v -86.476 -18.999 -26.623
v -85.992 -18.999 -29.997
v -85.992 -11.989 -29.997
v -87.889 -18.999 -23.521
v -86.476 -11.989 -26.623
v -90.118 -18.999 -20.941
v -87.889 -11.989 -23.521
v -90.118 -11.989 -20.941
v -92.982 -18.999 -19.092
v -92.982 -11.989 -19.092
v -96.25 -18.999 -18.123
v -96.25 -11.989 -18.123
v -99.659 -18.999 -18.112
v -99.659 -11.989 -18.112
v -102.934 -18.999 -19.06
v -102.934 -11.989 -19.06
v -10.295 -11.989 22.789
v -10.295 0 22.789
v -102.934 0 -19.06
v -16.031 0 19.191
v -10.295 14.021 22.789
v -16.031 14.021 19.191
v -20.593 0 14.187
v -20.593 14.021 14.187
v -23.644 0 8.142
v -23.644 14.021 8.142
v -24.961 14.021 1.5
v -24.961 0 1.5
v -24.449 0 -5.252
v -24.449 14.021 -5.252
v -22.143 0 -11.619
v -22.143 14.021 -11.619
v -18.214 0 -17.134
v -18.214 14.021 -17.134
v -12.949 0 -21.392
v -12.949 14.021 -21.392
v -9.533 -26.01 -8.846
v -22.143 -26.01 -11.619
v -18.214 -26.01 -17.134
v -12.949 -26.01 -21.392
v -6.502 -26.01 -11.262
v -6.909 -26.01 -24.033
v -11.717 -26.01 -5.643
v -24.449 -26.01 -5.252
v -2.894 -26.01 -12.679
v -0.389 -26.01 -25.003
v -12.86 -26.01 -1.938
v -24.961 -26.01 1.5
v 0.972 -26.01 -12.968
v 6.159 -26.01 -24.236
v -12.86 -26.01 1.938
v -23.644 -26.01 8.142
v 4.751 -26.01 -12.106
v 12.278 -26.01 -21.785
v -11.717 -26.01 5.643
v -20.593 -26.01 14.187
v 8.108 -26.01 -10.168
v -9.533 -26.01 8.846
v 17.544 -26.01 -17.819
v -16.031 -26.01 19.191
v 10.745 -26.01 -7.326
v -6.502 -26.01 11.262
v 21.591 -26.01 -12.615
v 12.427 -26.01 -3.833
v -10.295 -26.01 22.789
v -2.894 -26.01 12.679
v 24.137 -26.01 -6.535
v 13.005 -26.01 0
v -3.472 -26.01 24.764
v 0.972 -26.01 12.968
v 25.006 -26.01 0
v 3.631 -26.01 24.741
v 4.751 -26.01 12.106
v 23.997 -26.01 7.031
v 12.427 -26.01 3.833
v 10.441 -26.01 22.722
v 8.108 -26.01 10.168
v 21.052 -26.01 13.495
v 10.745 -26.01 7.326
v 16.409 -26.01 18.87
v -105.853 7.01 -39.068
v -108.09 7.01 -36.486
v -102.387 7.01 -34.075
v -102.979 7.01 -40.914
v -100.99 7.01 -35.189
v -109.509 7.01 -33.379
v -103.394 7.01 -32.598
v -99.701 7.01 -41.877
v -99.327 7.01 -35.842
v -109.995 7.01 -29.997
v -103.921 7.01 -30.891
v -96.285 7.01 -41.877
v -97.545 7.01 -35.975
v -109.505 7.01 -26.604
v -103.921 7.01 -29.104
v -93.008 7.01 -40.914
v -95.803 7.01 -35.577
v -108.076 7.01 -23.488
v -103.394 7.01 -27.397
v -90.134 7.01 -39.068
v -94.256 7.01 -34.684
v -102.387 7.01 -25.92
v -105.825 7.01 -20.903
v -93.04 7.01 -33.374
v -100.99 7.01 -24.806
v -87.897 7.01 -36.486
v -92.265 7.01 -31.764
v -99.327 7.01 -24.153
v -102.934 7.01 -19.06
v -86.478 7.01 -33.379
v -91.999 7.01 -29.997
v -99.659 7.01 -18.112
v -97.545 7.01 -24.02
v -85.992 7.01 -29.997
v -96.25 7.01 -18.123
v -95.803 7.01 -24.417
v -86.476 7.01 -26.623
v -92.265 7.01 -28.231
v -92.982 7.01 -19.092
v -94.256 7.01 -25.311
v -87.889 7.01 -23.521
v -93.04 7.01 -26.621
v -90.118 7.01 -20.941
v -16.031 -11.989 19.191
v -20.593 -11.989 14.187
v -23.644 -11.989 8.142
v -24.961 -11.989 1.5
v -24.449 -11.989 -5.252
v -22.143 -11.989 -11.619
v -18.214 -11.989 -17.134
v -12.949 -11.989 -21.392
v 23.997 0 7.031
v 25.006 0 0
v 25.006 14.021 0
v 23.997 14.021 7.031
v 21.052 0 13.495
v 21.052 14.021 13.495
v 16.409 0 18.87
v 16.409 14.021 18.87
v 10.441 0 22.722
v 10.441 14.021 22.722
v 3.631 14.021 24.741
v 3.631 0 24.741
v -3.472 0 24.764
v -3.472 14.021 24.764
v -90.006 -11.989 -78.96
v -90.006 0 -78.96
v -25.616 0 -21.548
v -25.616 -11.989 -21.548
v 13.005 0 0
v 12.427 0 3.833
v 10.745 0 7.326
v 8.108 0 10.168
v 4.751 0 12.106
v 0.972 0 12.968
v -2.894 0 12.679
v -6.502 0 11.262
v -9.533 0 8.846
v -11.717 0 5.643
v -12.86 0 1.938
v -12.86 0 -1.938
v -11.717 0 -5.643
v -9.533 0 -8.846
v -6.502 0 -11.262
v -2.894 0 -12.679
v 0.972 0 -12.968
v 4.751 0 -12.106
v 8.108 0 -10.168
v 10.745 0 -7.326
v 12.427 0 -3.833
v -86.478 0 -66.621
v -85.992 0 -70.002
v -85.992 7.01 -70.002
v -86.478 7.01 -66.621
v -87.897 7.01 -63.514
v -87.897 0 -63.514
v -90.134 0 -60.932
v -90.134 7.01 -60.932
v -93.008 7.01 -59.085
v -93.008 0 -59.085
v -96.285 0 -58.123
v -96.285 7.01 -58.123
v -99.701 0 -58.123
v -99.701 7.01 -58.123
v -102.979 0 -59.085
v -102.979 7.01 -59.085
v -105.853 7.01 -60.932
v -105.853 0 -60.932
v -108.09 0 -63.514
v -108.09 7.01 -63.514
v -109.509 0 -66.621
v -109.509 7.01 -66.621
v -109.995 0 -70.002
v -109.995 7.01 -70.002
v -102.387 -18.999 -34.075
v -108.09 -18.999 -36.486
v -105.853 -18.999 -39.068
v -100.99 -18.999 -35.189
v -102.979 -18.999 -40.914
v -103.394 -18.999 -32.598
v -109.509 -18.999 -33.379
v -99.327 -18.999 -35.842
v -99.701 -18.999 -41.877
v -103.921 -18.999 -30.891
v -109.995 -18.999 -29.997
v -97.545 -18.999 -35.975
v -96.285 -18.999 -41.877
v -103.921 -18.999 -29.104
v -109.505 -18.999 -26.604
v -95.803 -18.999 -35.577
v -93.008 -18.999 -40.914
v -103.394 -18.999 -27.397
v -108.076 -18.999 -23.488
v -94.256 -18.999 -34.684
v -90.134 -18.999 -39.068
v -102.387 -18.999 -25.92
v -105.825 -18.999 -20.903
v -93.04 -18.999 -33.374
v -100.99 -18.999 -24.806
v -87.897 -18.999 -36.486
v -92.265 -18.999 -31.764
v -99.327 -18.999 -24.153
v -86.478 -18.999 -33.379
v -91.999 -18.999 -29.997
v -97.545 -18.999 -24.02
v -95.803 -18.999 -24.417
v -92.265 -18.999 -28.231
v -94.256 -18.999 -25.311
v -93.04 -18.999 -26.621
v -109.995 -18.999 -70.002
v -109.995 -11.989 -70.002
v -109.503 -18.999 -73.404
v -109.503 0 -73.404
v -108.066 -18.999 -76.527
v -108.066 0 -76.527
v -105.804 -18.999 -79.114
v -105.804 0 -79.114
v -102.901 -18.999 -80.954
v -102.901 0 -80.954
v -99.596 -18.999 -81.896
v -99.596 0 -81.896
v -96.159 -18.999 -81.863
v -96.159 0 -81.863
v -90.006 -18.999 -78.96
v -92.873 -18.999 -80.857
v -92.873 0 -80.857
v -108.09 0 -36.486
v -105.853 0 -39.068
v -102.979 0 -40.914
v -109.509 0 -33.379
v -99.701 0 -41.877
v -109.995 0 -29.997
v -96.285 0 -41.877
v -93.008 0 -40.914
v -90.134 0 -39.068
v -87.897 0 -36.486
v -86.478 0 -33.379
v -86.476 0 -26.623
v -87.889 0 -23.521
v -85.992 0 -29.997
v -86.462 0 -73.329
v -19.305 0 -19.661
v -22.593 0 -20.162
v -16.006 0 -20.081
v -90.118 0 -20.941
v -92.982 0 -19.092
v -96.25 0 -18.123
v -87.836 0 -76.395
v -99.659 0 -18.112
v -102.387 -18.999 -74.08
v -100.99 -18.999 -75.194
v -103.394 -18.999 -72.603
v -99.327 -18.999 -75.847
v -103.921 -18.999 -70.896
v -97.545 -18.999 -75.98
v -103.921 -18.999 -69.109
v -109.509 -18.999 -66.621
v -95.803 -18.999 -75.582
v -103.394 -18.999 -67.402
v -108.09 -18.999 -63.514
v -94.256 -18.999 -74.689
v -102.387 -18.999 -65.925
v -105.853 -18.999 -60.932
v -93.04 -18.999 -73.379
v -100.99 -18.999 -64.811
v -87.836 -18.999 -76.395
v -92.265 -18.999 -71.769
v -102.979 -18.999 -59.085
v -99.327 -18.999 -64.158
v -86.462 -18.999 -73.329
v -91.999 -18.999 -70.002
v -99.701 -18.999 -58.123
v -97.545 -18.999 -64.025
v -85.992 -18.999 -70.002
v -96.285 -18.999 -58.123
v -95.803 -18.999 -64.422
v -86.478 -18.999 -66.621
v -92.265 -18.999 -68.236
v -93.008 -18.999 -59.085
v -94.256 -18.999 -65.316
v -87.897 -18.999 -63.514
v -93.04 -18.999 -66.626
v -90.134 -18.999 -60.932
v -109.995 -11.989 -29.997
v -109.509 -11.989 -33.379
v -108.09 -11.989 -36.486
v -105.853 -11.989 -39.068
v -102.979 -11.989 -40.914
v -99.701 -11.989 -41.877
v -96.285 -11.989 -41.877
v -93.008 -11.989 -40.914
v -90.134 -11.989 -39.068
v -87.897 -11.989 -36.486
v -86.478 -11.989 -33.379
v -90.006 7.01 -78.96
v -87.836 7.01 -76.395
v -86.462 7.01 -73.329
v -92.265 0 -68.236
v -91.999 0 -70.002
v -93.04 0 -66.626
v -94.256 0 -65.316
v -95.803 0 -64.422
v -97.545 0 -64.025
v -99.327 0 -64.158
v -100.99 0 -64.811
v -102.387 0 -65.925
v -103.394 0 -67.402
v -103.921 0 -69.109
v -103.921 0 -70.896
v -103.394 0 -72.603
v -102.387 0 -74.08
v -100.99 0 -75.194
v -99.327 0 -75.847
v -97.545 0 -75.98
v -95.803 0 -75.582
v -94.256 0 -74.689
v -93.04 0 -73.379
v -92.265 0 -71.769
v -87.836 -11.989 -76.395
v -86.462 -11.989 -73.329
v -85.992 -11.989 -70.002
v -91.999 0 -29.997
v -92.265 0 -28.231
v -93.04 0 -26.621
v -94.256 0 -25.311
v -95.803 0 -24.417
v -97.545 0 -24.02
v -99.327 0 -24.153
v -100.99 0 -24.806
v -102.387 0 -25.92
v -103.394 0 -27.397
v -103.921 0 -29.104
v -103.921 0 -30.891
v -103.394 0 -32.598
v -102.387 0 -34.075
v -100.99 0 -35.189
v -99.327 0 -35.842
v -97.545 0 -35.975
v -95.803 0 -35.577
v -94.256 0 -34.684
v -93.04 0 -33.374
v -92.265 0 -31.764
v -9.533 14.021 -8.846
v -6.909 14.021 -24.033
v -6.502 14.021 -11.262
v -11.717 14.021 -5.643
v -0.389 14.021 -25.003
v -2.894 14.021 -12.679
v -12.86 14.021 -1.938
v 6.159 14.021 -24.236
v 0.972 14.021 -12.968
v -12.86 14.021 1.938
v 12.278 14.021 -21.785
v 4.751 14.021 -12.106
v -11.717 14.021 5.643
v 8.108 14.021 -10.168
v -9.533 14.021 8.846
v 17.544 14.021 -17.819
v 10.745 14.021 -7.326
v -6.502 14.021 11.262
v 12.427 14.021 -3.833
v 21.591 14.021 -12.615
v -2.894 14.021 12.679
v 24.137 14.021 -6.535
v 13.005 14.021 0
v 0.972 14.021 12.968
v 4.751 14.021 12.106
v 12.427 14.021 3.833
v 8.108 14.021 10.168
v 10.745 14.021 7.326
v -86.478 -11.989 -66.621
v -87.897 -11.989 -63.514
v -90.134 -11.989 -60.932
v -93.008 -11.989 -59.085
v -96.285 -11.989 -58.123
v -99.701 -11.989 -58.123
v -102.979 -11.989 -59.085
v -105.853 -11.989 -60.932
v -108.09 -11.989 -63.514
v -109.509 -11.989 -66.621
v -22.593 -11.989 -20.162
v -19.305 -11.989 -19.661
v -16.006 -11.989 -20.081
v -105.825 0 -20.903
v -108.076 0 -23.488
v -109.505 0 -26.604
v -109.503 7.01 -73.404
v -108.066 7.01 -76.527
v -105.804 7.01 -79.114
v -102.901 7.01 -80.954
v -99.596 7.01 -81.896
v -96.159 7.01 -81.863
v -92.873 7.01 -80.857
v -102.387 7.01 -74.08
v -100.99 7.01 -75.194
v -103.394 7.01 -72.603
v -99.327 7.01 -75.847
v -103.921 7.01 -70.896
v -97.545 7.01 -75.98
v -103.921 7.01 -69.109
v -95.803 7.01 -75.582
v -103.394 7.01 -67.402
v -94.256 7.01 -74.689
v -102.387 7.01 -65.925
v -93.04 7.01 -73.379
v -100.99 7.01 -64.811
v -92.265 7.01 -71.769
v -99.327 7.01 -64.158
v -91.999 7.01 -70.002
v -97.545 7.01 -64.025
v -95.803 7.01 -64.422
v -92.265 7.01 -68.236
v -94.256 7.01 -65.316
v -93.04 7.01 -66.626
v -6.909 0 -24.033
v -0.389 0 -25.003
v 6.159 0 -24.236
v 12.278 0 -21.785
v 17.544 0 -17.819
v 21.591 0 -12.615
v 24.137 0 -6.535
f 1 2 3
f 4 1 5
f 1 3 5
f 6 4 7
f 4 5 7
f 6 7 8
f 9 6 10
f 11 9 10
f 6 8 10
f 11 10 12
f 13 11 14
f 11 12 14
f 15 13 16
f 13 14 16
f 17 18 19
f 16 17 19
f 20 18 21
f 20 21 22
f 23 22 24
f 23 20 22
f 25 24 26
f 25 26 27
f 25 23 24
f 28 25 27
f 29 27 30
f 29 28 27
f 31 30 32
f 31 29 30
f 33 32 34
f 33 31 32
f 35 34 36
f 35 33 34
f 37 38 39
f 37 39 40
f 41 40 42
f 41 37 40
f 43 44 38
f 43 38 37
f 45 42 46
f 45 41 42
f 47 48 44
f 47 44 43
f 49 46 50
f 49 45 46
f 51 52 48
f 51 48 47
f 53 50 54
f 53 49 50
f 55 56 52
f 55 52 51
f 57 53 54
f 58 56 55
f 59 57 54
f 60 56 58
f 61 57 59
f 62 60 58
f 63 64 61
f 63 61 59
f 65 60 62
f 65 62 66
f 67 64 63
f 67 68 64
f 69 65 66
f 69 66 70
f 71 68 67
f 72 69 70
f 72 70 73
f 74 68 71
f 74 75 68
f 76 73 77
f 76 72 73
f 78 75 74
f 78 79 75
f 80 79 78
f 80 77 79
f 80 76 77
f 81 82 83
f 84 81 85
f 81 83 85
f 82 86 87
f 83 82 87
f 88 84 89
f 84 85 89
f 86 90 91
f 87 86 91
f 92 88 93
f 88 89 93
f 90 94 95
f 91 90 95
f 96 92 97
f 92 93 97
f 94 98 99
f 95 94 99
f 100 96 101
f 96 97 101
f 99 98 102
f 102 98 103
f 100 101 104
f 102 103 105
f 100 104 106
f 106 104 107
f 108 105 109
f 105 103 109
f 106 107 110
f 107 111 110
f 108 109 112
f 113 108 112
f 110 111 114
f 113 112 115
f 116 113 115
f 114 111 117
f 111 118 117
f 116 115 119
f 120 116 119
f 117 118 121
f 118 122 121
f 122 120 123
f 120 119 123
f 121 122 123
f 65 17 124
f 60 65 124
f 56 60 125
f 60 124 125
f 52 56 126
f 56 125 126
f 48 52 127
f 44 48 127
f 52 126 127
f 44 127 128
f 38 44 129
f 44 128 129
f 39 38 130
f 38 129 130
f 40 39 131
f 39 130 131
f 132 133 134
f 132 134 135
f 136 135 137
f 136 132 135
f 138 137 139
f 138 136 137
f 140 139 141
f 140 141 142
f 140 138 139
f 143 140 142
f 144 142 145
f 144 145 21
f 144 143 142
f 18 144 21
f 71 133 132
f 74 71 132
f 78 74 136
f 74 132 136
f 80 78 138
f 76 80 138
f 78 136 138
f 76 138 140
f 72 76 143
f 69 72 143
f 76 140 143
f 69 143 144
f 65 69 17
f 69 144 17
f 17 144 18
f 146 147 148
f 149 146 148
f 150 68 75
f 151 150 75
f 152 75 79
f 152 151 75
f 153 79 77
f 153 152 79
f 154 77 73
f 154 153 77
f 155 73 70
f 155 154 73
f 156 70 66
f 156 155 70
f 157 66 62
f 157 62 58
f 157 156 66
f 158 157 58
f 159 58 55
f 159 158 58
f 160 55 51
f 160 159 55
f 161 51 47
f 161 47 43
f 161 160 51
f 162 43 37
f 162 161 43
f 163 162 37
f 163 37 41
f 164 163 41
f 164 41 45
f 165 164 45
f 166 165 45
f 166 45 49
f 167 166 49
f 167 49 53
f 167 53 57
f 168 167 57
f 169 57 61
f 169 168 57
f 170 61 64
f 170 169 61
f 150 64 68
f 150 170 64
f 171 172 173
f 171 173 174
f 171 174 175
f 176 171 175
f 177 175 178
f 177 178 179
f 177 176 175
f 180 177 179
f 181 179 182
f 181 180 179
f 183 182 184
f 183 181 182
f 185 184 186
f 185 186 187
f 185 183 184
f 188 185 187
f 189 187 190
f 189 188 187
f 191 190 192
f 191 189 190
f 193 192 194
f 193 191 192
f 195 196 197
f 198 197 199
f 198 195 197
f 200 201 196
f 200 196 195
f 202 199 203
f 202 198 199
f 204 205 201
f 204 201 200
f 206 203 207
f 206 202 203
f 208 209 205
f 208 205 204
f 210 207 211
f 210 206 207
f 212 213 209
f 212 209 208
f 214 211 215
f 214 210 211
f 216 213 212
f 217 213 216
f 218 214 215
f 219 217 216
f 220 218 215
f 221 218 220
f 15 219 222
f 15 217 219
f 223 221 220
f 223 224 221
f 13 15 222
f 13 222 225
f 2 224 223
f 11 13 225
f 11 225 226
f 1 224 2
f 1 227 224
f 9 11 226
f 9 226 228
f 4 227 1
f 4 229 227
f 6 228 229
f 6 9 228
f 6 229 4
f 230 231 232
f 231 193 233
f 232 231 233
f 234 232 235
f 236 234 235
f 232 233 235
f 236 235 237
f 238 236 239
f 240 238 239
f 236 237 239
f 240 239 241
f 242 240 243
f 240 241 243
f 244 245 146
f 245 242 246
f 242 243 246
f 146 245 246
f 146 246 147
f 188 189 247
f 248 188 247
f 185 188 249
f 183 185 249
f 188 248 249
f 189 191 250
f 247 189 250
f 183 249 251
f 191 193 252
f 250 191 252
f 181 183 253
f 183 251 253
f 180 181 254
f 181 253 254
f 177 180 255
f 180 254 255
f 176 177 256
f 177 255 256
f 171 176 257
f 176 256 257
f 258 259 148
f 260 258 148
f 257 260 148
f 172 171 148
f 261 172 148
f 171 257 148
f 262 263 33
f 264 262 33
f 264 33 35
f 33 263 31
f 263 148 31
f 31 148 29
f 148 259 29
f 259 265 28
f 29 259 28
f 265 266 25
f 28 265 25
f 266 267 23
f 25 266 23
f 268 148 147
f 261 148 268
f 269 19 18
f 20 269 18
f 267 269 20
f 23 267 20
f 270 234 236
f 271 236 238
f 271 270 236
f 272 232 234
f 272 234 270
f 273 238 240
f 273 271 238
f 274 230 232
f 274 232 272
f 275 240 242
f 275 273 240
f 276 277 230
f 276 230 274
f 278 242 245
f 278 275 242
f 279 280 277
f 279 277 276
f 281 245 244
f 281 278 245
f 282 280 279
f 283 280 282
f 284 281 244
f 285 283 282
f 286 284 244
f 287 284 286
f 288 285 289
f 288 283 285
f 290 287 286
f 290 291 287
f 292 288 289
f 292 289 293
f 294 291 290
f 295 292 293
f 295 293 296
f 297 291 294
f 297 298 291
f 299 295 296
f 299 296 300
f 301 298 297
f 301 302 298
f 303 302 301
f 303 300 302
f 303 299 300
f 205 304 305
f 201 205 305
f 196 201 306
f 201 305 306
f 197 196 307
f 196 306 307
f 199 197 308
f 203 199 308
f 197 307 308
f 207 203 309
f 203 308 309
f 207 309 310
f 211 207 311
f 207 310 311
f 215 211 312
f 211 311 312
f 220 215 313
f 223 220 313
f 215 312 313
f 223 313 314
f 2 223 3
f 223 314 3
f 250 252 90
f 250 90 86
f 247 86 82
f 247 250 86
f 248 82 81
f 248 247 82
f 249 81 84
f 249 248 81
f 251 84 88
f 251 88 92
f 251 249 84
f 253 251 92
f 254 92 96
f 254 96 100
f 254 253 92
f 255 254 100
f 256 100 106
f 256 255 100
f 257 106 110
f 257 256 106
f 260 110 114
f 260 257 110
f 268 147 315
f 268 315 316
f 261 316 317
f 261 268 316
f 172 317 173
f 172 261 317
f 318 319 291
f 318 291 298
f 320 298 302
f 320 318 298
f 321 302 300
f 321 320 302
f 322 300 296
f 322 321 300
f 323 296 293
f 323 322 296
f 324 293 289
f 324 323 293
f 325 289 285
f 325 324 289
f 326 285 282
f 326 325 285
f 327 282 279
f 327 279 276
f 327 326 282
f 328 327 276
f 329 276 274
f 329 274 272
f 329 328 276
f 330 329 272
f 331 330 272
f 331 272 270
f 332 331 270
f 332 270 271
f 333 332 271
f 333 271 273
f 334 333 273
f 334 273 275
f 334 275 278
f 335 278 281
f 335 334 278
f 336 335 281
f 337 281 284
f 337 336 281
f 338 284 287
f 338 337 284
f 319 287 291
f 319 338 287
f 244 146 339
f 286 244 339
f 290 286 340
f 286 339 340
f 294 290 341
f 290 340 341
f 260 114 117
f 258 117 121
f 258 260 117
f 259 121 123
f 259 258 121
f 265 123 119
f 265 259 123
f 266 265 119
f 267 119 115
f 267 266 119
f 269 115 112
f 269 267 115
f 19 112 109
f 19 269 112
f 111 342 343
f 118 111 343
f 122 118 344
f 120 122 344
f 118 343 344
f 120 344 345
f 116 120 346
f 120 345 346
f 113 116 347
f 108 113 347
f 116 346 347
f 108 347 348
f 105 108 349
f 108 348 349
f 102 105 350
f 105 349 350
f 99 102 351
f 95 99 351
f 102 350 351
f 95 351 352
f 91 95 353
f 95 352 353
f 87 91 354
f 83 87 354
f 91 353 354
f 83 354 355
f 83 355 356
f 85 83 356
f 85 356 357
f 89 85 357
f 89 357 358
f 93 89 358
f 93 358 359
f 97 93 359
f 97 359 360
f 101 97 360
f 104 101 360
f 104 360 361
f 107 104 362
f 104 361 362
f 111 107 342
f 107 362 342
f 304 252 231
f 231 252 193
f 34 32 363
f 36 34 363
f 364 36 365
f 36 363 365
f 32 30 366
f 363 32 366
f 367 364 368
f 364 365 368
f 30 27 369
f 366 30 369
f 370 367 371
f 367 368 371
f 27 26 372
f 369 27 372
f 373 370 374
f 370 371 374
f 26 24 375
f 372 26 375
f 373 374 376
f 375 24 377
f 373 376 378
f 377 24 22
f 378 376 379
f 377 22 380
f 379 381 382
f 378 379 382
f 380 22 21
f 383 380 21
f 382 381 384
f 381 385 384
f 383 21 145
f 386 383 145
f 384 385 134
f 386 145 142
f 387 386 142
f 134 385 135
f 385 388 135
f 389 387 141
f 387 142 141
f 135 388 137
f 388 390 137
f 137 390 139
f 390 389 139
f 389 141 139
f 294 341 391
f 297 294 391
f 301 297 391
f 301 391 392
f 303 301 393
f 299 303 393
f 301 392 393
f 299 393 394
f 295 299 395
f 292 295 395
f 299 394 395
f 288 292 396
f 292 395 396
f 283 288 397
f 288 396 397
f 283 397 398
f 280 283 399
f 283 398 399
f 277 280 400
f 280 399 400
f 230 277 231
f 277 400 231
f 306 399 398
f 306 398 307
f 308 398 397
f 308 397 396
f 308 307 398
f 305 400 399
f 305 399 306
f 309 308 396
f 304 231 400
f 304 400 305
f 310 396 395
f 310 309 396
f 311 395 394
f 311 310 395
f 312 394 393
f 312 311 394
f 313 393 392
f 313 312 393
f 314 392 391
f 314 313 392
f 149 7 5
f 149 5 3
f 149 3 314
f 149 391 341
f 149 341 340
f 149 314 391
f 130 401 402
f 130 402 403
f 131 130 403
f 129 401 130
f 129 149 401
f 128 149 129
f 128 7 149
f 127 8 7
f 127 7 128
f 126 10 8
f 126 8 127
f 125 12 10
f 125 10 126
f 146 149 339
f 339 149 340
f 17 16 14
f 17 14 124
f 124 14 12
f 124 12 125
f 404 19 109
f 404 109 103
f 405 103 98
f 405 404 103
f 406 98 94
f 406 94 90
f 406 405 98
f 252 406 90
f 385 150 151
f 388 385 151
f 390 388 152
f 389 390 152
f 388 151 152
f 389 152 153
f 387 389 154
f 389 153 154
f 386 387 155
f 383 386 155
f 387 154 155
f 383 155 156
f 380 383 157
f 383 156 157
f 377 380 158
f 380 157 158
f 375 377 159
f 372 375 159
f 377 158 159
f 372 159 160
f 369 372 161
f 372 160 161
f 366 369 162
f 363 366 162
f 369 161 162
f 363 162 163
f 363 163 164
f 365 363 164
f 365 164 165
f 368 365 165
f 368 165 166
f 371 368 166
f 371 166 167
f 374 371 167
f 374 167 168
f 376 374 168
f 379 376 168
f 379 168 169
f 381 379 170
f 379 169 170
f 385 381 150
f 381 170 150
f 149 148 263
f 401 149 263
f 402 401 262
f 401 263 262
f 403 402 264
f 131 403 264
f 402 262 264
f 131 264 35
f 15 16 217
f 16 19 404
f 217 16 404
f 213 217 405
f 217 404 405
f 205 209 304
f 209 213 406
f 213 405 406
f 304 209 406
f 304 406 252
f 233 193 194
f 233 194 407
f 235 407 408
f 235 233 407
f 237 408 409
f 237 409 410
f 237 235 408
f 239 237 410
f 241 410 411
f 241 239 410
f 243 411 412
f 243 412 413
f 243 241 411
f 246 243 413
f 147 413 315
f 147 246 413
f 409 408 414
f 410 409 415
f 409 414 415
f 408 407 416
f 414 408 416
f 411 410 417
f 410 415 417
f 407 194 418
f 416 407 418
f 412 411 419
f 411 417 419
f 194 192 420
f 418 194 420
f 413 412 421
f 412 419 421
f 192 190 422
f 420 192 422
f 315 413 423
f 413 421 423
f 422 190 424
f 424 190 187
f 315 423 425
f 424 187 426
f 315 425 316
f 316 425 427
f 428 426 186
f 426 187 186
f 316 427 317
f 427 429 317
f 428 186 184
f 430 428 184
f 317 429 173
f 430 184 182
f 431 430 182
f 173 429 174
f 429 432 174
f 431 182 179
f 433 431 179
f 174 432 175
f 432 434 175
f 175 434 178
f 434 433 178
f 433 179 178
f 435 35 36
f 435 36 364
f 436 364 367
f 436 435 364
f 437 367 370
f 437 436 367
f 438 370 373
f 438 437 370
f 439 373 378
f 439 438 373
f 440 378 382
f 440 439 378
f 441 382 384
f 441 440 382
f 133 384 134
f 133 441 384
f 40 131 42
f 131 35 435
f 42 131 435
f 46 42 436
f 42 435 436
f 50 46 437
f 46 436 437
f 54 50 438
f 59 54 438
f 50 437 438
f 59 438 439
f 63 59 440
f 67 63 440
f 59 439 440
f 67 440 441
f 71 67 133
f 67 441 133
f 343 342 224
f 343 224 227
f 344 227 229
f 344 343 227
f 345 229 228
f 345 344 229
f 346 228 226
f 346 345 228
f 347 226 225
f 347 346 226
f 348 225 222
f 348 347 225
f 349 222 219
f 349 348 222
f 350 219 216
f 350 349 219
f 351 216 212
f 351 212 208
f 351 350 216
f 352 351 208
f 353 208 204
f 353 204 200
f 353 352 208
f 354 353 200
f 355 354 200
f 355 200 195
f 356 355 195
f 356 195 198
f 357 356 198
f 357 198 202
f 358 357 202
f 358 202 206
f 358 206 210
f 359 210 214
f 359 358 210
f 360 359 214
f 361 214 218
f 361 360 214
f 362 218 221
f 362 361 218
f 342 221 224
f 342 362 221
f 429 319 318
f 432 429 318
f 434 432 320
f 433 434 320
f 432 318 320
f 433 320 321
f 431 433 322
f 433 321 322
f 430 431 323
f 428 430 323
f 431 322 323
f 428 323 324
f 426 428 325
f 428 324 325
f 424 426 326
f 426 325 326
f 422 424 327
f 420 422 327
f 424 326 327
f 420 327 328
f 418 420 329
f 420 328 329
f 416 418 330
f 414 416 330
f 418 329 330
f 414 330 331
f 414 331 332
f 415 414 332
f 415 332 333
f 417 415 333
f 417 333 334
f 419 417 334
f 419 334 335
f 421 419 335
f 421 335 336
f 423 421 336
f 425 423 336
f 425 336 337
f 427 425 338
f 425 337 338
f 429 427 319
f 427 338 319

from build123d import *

# Parameters (mm, degrees)
F1_DEPTH      = 11.9888
F0_R          = 5.9944
F2_DEPTH      = 7.0104
F2_DEPTH_BACK = 18.9992
F0_R_2        = 13.0048
F3_DEPTH      = 14.0208
F3_DEPTH_BACK = 26.0096


with BuildPart() as f1:
    # F0 (on Front) → F1 (new body)
    with BuildSketch(Plane.XZ):
        with BuildLine():
            ThreePointArc((-102.9340252947, -19.0601129663), (-91.4840261862, -19.9144114295), (-85.9917, -29.9974))
            ThreePointArc((-85.9917, -29.9974), (-97.9932, -41.9989), (-109.9947, -29.9974))
            Line((-109.9947, -29.9974), (-109.9947, -70.0024))
            ThreePointArc((-109.9947, -70.0024), (-97.9932, -58.0009), (-85.9917, -70.0024))
            ThreePointArc((-85.9917, -70.0024), (-87.0411891719, -74.910501575), (-90.0061083773, -78.9602105395))
            Line((-90.0061083773, -78.9602105395), (-25.6162571026, -21.548007029))
            ThreePointArc((-25.6162571026, -21.548007029), (-19.305050019, -19.660505954), (-12.9493464286, -21.3922758668))
            ThreePointArc((-12.9493464286, -21.3922758668), (-24.9612819832, 1.4998138042), (-10.2946931272, 22.7889081157))
            Line((-10.2946931272, 22.7889081157), (-102.9340252947, -19.0601129663))
        make_face()
    extrude(amount=F1_DEPTH)

    # F0 (on Front) → F2 (join, two sides)
    with BuildSketch(Plane.XZ) as f2_sk:
        with BuildLine():
            ThreePointArc((-109.9947, -29.9974), (-97.9932, -41.9989), (-85.9917, -29.9974))
            ThreePointArc((-85.9917, -29.9974), (-91.4840261862, -19.9144114295), (-102.9340252947, -19.0601129663))
            ThreePointArc((-102.9340252947, -19.0601129663), (-108.0761885705, -23.4882261862), (-109.9947, -29.9974))
        make_face()
        with Locations((-97.9932, -29.9974)):
            Circle(F0_R, mode=Mode.SUBTRACT)
        with BuildLine():
            ThreePointArc((-85.9917, -70.0024), (-97.9932, -58.0009), (-109.9947, -70.0024))
            ThreePointArc((-109.9947, -70.0024), (-102.901301575, -80.9544108281), (-90.0061083773, -78.9602105395))
            ThreePointArc((-90.0061083773, -78.9602105395), (-87.0411891719, -74.910501575), (-85.9917, -70.0024))
        make_face()
        with Locations((-97.9932, -70.0024)):
            Circle(F0_R, mode=Mode.SUBTRACT)
    extrude(amount=-F2_DEPTH)
    extrude(f2_sk.sketch, amount=F2_DEPTH_BACK)

    # F0 (on Front) → F3 (join, two sides)
    with BuildSketch(Plane.XZ) as f3_sk:
        with BuildLine():
            ThreePointArc((25.0063, 0), (13.5625007824, 21.0088936457), (-10.2946931272, 22.7889081157))
            ThreePointArc((-10.2946931272, 22.7889081157), (-24.9612819832, 1.4998138042), (-12.9493464286, -21.3922758668))
            ThreePointArc((-12.9493464286, -21.3922758668), (12.2780250466, -21.7845160755), (25.0063, 0))
        make_face()
        Circle(F0_R_2, mode=Mode.SUBTRACT)
    extrude(amount=-F3_DEPTH)
    extrude(f3_sk.sketch, amount=F3_DEPTH_BACK)


solid = f1.part
